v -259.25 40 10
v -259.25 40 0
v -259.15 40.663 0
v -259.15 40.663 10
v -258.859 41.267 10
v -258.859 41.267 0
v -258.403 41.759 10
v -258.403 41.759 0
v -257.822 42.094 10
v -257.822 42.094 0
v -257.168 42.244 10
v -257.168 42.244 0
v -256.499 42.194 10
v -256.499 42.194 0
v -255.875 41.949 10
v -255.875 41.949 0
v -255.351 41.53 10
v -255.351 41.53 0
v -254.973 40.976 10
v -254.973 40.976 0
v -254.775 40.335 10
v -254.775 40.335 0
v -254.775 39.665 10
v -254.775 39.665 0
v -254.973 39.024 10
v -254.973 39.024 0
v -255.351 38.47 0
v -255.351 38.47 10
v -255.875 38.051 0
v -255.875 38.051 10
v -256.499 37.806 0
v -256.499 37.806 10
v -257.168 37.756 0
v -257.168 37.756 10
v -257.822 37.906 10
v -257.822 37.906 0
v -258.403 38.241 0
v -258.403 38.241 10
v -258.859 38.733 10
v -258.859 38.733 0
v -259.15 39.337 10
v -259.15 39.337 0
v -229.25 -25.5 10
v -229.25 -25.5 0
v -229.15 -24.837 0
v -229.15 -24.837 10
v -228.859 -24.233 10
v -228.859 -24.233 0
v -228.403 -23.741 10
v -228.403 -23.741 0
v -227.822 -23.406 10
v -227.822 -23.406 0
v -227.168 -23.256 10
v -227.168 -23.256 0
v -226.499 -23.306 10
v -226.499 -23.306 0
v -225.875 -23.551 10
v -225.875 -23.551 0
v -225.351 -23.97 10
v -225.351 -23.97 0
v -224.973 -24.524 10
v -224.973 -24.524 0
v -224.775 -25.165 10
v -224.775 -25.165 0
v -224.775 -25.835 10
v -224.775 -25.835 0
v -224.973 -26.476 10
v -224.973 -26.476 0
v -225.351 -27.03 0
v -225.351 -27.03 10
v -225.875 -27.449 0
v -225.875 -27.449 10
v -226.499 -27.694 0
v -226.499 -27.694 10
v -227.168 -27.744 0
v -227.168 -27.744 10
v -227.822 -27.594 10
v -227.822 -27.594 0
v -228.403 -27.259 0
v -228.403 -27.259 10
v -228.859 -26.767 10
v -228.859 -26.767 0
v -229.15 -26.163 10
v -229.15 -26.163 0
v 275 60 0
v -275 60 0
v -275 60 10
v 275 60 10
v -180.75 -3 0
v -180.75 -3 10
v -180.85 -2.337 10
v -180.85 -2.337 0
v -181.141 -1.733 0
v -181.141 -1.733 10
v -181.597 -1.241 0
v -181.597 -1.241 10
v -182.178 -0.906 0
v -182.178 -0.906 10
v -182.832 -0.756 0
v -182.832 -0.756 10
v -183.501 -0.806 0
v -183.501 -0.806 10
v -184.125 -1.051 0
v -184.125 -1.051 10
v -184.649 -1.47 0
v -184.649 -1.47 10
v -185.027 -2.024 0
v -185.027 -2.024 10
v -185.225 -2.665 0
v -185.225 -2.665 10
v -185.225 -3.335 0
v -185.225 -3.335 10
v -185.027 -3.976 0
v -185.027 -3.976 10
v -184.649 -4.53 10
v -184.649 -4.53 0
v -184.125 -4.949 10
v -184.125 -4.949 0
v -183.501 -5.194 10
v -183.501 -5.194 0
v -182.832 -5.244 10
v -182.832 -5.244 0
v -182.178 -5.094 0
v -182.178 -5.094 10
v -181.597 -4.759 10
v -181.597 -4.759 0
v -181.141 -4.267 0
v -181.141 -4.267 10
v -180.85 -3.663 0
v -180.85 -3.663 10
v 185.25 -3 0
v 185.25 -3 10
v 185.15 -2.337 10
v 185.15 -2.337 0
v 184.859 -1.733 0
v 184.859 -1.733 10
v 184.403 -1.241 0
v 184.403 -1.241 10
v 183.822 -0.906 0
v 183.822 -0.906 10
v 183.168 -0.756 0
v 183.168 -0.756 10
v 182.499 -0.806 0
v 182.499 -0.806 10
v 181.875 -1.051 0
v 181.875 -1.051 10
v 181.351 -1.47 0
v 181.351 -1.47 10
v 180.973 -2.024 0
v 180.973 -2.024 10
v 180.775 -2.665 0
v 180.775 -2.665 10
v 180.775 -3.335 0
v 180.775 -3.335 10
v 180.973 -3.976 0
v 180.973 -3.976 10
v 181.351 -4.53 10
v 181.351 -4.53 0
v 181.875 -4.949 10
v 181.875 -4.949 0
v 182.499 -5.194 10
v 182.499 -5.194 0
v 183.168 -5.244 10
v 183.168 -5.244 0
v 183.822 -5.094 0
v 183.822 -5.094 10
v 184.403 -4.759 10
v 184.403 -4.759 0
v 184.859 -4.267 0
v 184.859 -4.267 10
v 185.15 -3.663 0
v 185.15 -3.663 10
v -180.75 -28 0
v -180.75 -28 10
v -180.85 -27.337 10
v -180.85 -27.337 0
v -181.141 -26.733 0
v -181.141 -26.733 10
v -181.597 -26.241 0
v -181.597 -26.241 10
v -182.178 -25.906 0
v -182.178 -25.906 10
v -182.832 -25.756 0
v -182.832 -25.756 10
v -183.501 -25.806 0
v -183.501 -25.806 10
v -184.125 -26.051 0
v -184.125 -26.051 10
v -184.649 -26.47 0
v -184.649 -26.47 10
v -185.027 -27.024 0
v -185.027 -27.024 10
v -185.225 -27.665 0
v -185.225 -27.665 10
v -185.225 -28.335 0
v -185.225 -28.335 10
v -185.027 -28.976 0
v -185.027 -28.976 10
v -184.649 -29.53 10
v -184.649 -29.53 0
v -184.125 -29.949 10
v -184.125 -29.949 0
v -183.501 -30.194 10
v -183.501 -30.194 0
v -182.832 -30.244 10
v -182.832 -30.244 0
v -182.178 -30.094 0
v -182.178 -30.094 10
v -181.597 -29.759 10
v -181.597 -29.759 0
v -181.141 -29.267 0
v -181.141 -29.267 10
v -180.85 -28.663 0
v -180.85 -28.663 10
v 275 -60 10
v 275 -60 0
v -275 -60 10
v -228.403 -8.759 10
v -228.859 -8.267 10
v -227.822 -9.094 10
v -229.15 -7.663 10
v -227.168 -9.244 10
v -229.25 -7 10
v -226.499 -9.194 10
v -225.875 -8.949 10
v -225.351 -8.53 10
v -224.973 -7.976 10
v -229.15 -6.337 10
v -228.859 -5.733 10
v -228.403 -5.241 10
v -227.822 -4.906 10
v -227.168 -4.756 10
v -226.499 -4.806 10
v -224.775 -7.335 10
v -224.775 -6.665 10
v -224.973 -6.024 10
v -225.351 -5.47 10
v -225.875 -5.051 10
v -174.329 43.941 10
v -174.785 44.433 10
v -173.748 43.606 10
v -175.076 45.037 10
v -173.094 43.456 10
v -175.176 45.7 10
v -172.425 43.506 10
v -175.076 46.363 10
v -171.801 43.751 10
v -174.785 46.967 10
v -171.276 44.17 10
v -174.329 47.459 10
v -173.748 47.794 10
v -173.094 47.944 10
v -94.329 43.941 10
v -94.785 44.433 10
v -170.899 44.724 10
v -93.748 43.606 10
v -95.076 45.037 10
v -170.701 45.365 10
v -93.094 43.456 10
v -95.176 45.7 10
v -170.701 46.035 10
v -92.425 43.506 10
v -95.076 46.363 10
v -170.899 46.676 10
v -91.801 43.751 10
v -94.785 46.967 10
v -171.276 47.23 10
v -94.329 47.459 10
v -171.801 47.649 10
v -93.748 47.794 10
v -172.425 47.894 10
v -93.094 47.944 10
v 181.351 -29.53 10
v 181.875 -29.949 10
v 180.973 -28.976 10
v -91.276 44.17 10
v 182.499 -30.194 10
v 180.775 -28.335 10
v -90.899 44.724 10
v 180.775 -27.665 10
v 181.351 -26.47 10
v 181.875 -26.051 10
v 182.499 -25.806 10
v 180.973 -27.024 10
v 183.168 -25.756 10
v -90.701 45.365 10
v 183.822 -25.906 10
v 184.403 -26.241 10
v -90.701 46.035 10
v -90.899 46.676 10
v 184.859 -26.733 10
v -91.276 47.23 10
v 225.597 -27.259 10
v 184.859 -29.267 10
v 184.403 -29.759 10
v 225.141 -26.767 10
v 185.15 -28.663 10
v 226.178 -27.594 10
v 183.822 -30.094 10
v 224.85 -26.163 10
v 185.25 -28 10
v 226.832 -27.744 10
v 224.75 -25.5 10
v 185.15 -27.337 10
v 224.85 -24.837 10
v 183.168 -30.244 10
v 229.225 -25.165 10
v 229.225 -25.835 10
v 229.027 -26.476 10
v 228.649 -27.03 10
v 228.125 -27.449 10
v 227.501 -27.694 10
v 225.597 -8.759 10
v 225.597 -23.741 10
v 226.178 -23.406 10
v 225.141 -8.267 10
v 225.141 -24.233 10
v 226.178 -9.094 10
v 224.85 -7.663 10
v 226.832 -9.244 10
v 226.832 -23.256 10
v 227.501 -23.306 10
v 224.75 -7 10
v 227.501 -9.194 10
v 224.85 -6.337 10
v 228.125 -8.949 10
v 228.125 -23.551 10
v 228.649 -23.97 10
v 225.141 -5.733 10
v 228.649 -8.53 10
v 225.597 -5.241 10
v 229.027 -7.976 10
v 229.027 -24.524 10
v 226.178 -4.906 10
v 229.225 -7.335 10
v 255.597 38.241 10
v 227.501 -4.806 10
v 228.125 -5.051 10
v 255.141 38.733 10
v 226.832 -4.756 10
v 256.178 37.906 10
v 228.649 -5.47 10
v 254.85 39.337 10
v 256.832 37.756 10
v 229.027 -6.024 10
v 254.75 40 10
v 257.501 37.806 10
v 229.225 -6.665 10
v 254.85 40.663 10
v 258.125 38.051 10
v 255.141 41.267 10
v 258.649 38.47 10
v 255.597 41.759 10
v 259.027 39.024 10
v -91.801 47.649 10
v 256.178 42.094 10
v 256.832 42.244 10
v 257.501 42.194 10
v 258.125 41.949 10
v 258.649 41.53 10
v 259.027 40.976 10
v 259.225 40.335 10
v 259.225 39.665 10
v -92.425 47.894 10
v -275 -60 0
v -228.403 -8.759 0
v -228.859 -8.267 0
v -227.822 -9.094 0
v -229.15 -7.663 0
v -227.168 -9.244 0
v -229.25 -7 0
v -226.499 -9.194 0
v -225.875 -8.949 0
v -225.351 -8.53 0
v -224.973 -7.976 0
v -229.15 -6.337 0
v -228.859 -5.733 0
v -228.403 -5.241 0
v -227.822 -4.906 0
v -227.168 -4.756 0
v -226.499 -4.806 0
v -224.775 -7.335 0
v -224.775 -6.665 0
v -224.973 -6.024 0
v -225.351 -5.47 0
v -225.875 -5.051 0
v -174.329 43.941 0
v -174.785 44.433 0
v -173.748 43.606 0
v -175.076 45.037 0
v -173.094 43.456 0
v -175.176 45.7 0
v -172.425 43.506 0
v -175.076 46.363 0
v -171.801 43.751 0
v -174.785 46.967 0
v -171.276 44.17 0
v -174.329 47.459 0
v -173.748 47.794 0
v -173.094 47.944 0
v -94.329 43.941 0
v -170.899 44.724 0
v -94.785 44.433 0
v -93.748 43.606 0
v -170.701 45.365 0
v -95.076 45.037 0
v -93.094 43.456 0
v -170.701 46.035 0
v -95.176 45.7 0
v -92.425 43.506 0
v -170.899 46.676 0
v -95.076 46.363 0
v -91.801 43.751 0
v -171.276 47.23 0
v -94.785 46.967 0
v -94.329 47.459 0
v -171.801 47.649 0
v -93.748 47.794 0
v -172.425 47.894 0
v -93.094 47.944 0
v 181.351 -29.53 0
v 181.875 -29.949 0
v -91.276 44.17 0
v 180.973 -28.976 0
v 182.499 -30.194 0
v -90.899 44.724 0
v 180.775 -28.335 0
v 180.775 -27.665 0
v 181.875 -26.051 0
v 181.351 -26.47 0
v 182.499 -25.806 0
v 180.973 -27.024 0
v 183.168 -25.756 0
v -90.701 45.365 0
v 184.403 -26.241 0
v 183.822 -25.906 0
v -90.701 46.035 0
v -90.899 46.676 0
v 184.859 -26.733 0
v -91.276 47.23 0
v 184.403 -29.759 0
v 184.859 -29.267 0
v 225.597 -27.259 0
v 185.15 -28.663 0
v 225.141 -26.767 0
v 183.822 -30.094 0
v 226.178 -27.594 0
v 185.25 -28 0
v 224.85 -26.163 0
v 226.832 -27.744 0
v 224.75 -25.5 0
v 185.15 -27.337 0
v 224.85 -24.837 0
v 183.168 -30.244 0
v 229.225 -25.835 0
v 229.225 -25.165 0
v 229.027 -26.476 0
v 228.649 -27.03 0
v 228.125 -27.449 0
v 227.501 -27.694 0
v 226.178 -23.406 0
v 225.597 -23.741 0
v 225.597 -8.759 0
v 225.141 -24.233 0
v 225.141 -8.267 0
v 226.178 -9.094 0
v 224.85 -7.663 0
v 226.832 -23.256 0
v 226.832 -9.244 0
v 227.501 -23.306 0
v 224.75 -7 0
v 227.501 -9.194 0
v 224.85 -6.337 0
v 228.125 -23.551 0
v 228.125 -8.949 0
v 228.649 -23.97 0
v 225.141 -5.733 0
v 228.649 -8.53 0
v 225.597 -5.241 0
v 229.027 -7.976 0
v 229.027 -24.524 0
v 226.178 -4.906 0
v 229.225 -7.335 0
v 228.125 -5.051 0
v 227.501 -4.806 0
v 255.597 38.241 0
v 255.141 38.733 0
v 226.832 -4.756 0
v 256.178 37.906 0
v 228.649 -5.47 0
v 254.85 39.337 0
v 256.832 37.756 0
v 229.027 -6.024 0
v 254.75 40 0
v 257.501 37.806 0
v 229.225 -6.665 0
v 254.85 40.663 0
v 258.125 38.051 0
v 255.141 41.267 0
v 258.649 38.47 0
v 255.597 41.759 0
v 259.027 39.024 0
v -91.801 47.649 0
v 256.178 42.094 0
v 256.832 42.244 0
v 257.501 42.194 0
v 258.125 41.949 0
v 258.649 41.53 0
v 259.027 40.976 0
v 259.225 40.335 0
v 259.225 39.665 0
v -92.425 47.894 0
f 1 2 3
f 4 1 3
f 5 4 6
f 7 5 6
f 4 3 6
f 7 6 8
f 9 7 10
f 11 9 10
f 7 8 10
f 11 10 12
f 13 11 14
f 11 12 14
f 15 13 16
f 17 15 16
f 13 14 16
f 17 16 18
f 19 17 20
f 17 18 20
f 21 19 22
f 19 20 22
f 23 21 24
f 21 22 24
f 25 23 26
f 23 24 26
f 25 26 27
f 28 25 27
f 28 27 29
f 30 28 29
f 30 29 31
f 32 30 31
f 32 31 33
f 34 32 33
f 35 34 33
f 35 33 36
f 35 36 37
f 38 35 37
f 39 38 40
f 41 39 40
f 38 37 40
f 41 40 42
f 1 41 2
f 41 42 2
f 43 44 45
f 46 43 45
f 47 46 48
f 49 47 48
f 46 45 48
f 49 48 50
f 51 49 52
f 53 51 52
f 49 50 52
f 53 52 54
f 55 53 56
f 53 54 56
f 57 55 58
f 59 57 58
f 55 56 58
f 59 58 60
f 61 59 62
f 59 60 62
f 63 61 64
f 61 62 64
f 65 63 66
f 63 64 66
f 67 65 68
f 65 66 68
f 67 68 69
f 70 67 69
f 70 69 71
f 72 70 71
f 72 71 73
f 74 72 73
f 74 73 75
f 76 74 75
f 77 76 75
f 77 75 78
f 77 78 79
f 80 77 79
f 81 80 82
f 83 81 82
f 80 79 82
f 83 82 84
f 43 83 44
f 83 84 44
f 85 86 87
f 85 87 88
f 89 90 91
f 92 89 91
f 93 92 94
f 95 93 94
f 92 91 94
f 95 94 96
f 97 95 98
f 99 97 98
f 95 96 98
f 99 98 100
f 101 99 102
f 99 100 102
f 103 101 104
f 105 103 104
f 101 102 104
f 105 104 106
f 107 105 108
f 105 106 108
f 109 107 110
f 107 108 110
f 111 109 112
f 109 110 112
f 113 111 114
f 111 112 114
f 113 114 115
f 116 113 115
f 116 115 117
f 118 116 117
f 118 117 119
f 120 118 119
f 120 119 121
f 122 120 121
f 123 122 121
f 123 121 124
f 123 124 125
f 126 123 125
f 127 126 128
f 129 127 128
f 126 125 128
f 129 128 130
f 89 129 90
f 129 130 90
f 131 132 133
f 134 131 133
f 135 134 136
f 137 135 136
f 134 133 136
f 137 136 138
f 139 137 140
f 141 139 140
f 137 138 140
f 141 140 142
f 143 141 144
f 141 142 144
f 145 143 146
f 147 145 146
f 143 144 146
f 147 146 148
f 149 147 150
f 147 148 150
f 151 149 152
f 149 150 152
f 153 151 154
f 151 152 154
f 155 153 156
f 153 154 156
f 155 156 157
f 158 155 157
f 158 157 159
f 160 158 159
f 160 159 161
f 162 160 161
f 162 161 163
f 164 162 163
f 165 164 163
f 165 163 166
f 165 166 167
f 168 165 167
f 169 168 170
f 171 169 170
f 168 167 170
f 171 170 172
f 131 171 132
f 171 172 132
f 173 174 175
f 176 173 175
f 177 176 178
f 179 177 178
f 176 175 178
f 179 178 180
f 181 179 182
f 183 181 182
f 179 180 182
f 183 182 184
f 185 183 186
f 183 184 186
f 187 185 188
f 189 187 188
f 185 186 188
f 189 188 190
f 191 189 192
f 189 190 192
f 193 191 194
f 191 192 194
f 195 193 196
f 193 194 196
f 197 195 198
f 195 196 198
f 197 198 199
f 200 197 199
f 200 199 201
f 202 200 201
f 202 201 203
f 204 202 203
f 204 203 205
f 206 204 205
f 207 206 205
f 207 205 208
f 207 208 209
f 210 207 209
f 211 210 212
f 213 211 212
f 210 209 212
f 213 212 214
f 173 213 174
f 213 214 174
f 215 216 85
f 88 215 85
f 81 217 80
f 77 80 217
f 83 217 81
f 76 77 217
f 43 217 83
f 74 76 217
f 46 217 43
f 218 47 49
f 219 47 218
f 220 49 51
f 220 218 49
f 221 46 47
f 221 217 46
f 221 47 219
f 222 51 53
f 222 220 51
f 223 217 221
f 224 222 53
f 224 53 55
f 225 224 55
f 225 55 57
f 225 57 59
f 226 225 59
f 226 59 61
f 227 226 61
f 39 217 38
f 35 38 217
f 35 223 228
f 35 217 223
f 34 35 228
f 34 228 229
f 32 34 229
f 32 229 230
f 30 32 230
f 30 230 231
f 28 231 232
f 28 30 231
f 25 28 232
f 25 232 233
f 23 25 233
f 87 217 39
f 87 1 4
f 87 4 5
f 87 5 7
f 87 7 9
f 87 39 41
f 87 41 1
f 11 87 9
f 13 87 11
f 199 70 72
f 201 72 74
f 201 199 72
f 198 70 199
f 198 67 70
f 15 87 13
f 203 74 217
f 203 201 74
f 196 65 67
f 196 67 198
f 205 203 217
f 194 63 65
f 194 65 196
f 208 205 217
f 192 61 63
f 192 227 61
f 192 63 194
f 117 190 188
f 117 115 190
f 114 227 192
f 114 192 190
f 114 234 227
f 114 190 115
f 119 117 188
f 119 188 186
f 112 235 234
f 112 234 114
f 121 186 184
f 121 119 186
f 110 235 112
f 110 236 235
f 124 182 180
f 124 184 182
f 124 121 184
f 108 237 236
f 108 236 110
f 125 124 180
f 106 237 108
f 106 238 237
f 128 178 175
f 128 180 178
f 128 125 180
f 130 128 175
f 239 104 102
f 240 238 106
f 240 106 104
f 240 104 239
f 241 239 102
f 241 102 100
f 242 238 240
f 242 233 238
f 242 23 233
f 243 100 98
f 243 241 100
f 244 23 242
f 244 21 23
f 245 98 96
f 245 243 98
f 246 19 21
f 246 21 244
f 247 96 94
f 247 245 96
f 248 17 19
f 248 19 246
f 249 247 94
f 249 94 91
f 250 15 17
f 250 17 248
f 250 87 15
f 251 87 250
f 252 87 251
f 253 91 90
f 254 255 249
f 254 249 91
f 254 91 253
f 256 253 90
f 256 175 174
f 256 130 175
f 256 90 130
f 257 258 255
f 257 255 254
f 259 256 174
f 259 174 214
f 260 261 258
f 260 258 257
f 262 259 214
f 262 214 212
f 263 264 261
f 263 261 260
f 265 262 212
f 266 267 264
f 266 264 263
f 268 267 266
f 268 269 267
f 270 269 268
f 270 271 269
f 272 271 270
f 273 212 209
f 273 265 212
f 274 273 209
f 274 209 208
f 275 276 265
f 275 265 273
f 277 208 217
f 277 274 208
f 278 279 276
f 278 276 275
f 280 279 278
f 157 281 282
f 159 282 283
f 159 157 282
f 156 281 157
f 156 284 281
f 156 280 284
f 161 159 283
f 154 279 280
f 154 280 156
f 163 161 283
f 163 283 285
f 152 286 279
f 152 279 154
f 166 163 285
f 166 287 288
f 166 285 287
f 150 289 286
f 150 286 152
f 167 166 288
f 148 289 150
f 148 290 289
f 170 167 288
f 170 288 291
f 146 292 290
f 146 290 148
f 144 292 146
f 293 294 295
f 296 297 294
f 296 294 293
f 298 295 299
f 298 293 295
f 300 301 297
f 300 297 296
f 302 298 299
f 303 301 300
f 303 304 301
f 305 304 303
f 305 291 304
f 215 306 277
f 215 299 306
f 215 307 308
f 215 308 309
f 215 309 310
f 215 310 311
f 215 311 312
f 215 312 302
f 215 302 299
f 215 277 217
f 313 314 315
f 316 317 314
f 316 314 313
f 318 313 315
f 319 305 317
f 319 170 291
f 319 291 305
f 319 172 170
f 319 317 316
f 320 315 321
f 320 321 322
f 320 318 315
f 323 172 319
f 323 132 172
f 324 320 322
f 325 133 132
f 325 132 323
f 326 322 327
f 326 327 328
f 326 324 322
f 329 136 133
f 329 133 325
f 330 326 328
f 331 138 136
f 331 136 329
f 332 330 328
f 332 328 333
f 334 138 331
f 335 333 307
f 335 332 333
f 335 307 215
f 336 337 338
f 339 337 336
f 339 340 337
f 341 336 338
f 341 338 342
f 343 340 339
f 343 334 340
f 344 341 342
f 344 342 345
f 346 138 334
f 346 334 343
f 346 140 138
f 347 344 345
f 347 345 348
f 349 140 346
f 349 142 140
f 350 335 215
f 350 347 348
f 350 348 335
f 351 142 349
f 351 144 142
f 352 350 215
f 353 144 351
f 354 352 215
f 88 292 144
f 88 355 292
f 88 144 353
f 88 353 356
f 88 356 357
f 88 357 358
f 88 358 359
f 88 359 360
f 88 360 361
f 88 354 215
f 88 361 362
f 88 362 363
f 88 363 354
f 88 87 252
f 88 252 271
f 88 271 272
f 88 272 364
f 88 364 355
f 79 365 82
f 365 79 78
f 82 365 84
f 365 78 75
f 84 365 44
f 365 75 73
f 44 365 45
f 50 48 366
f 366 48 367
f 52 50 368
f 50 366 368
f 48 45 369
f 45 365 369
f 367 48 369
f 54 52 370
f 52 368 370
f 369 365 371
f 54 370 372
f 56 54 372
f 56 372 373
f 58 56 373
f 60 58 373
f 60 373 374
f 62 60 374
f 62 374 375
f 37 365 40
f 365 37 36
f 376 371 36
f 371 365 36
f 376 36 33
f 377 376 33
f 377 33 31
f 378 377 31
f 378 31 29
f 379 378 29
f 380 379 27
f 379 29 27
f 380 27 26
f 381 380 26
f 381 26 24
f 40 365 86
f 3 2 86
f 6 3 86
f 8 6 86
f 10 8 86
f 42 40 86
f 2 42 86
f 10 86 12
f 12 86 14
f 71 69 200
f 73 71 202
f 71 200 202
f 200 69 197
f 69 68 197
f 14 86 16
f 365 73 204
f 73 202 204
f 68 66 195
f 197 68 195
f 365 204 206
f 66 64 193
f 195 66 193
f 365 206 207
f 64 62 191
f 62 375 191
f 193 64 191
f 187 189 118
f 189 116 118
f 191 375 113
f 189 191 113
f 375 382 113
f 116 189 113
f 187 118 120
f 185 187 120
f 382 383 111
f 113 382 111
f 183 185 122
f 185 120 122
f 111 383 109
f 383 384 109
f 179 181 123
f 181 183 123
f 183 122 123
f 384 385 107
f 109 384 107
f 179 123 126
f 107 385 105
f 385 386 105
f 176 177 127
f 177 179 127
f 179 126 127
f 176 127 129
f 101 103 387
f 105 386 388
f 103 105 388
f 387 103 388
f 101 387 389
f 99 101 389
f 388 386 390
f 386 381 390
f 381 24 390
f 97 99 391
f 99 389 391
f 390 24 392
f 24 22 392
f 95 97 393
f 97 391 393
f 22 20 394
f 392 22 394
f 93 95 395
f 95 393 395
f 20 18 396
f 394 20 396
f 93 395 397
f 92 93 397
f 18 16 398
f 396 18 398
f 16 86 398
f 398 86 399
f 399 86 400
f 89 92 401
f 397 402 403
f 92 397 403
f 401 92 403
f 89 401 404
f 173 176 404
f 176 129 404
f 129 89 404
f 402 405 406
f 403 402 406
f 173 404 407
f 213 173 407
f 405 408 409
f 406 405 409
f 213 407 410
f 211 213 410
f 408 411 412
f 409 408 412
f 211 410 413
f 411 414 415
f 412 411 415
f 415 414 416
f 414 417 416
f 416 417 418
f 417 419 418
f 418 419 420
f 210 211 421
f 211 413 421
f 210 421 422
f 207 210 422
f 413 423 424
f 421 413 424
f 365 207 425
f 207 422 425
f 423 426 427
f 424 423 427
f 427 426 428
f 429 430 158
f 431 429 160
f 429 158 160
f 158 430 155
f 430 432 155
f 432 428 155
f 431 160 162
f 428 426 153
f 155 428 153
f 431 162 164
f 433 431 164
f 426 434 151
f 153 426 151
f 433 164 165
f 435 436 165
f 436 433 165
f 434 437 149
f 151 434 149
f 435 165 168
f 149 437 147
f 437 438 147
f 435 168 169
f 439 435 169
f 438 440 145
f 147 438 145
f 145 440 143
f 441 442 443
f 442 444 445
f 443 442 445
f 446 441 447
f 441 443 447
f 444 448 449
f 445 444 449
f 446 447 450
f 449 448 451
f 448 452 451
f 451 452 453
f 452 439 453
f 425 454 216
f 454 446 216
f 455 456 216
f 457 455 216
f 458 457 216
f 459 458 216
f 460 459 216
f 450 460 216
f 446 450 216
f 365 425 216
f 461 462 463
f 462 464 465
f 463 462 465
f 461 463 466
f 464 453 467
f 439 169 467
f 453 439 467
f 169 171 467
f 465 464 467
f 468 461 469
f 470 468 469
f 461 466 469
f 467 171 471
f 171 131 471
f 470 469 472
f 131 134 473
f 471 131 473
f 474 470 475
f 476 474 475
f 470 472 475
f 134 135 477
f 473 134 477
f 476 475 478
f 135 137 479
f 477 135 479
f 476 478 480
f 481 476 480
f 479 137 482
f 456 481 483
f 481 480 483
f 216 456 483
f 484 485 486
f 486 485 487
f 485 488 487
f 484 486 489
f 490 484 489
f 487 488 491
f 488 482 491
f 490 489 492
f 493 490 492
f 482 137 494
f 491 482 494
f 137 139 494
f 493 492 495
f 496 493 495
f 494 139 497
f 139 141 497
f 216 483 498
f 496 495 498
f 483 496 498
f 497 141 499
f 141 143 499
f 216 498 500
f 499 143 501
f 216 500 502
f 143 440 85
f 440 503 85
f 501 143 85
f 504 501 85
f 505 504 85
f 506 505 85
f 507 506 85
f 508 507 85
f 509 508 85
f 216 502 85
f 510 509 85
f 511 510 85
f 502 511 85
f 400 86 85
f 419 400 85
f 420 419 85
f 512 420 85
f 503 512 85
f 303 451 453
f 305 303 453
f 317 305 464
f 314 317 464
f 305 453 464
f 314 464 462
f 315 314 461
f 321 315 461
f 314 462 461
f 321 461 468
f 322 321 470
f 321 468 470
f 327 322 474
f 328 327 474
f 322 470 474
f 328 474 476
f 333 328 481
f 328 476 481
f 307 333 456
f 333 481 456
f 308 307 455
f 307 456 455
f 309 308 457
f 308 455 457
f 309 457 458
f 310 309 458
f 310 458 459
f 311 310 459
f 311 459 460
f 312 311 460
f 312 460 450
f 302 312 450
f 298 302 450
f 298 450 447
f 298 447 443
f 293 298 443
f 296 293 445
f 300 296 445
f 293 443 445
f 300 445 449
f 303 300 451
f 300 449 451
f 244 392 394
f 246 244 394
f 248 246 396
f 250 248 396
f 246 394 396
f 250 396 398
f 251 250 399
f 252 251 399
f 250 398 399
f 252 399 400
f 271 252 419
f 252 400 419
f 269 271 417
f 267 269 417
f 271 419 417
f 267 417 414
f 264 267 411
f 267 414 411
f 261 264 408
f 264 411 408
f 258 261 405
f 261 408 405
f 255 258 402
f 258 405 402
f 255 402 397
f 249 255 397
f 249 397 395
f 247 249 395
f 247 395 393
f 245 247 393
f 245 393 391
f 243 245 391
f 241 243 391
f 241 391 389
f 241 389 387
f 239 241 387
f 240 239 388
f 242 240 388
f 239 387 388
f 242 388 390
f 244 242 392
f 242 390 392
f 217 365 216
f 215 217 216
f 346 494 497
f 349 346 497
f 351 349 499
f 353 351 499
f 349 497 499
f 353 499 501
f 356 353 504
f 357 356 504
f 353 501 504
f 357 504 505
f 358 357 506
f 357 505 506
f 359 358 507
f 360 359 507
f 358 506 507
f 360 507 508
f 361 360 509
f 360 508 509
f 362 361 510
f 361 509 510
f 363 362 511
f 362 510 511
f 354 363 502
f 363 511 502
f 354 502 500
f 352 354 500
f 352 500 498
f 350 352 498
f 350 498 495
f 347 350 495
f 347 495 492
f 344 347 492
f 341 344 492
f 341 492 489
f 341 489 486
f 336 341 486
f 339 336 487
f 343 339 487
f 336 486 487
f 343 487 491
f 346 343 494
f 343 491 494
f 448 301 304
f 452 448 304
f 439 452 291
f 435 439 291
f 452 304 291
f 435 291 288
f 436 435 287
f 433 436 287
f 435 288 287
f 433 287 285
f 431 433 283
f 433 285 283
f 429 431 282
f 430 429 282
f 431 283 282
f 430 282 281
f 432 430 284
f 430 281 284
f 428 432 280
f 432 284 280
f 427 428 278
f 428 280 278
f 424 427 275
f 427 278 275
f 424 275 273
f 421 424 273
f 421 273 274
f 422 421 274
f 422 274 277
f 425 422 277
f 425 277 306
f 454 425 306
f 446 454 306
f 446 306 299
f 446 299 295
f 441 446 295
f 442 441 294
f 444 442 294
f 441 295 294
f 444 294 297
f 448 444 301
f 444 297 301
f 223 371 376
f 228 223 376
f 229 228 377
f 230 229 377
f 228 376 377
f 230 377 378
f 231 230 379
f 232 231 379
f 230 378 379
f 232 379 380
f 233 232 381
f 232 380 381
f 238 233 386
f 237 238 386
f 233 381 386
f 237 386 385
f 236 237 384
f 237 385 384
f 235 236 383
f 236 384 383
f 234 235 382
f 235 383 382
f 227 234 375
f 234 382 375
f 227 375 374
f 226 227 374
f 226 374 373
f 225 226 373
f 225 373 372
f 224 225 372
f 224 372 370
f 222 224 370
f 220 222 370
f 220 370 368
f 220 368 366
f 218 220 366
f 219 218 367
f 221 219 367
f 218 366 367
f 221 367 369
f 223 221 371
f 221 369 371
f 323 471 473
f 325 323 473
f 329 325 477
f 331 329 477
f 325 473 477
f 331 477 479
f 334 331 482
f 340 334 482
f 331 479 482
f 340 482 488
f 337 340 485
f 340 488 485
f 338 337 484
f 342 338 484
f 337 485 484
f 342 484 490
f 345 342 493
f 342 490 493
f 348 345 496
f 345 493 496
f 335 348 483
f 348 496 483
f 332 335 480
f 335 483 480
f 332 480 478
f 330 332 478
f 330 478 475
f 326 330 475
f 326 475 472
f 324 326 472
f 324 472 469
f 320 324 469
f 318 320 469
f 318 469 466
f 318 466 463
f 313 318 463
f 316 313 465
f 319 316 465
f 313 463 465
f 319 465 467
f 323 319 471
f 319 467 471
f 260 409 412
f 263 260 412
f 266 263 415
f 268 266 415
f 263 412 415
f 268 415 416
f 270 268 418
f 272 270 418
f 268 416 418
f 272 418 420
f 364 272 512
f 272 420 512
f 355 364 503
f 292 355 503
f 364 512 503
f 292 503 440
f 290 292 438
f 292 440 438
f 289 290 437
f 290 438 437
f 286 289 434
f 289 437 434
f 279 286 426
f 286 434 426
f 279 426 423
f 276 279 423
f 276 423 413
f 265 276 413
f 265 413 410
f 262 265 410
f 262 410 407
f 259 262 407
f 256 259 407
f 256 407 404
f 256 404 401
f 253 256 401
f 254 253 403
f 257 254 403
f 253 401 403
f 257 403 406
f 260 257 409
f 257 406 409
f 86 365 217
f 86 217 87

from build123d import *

# Parameters (mm, degrees)
SCHIZZO1_W                   = 550
SCHIZZO1_H                   = 120
ESTRUSIONE_ESTRUSIONE1_DEPTH = 10
SCHIZZO2_R                   = 2.25
TAGLIO_ESTRUSIONE1_DEPTH     = 10
SCHIZZO3_R                   = 2.25
TAGLIO_ESTRUSIONE2_DEPTH     = 10


with BuildPart() as part:
    # Schizzo1 → Estrusione-Estrusione1 (new body)
    with BuildSketch(Plane.XY):
        Rectangle(SCHIZZO1_W, SCHIZZO1_H)
    extrude(amount=ESTRUSIONE_ESTRUSIONE1_DEPTH)

    # Schizzo2 → Taglio-Estrusione1 (cut)
    with BuildSketch(Plane(origin=(0, 0, 0), x_dir=(-1, 0, 0), z_dir=(0, 0, -1))):
        with Locations((-227, -7)):
            Circle(SCHIZZO2_R)
        with Locations((-227, -25.5)):
            Circle(SCHIZZO2_R)
        with Locations((227, -7)):
            Circle(SCHIZZO2_R)
        with Locations((227, -25.5)):
            Circle(SCHIZZO2_R)
        with Locations((-257, 40)):
            Circle(SCHIZZO2_R)
        with Locations((257, 40)):
            Circle(SCHIZZO2_R)
        with Locations((172.925688, 45.7)):
            Circle(SCHIZZO2_R)
        with Locations((92.925688, 45.7)):
            Circle(SCHIZZO2_R)
    extrude(amount=-TAGLIO_ESTRUSIONE1_DEPTH, mode=Mode.SUBTRACT)

    # Schizzo3 → Taglio-Estrusione2 (cut)
    with BuildSketch(Plane.XY.offset(10)):
        with Locations((-183, -3)):
            Circle(SCHIZZO3_R)
        with Locations((-183, -28)):
            Circle(SCHIZZO3_R)
        with Locations((183, -28)):
            Circle(SCHIZZO3_R)
        with Locations((183, -3)):
            Circle(SCHIZZO3_R)
    extrude(amount=-TAGLIO_ESTRUSIONE2_DEPTH, mode=Mode.SUBTRACT)


solid = part.part
